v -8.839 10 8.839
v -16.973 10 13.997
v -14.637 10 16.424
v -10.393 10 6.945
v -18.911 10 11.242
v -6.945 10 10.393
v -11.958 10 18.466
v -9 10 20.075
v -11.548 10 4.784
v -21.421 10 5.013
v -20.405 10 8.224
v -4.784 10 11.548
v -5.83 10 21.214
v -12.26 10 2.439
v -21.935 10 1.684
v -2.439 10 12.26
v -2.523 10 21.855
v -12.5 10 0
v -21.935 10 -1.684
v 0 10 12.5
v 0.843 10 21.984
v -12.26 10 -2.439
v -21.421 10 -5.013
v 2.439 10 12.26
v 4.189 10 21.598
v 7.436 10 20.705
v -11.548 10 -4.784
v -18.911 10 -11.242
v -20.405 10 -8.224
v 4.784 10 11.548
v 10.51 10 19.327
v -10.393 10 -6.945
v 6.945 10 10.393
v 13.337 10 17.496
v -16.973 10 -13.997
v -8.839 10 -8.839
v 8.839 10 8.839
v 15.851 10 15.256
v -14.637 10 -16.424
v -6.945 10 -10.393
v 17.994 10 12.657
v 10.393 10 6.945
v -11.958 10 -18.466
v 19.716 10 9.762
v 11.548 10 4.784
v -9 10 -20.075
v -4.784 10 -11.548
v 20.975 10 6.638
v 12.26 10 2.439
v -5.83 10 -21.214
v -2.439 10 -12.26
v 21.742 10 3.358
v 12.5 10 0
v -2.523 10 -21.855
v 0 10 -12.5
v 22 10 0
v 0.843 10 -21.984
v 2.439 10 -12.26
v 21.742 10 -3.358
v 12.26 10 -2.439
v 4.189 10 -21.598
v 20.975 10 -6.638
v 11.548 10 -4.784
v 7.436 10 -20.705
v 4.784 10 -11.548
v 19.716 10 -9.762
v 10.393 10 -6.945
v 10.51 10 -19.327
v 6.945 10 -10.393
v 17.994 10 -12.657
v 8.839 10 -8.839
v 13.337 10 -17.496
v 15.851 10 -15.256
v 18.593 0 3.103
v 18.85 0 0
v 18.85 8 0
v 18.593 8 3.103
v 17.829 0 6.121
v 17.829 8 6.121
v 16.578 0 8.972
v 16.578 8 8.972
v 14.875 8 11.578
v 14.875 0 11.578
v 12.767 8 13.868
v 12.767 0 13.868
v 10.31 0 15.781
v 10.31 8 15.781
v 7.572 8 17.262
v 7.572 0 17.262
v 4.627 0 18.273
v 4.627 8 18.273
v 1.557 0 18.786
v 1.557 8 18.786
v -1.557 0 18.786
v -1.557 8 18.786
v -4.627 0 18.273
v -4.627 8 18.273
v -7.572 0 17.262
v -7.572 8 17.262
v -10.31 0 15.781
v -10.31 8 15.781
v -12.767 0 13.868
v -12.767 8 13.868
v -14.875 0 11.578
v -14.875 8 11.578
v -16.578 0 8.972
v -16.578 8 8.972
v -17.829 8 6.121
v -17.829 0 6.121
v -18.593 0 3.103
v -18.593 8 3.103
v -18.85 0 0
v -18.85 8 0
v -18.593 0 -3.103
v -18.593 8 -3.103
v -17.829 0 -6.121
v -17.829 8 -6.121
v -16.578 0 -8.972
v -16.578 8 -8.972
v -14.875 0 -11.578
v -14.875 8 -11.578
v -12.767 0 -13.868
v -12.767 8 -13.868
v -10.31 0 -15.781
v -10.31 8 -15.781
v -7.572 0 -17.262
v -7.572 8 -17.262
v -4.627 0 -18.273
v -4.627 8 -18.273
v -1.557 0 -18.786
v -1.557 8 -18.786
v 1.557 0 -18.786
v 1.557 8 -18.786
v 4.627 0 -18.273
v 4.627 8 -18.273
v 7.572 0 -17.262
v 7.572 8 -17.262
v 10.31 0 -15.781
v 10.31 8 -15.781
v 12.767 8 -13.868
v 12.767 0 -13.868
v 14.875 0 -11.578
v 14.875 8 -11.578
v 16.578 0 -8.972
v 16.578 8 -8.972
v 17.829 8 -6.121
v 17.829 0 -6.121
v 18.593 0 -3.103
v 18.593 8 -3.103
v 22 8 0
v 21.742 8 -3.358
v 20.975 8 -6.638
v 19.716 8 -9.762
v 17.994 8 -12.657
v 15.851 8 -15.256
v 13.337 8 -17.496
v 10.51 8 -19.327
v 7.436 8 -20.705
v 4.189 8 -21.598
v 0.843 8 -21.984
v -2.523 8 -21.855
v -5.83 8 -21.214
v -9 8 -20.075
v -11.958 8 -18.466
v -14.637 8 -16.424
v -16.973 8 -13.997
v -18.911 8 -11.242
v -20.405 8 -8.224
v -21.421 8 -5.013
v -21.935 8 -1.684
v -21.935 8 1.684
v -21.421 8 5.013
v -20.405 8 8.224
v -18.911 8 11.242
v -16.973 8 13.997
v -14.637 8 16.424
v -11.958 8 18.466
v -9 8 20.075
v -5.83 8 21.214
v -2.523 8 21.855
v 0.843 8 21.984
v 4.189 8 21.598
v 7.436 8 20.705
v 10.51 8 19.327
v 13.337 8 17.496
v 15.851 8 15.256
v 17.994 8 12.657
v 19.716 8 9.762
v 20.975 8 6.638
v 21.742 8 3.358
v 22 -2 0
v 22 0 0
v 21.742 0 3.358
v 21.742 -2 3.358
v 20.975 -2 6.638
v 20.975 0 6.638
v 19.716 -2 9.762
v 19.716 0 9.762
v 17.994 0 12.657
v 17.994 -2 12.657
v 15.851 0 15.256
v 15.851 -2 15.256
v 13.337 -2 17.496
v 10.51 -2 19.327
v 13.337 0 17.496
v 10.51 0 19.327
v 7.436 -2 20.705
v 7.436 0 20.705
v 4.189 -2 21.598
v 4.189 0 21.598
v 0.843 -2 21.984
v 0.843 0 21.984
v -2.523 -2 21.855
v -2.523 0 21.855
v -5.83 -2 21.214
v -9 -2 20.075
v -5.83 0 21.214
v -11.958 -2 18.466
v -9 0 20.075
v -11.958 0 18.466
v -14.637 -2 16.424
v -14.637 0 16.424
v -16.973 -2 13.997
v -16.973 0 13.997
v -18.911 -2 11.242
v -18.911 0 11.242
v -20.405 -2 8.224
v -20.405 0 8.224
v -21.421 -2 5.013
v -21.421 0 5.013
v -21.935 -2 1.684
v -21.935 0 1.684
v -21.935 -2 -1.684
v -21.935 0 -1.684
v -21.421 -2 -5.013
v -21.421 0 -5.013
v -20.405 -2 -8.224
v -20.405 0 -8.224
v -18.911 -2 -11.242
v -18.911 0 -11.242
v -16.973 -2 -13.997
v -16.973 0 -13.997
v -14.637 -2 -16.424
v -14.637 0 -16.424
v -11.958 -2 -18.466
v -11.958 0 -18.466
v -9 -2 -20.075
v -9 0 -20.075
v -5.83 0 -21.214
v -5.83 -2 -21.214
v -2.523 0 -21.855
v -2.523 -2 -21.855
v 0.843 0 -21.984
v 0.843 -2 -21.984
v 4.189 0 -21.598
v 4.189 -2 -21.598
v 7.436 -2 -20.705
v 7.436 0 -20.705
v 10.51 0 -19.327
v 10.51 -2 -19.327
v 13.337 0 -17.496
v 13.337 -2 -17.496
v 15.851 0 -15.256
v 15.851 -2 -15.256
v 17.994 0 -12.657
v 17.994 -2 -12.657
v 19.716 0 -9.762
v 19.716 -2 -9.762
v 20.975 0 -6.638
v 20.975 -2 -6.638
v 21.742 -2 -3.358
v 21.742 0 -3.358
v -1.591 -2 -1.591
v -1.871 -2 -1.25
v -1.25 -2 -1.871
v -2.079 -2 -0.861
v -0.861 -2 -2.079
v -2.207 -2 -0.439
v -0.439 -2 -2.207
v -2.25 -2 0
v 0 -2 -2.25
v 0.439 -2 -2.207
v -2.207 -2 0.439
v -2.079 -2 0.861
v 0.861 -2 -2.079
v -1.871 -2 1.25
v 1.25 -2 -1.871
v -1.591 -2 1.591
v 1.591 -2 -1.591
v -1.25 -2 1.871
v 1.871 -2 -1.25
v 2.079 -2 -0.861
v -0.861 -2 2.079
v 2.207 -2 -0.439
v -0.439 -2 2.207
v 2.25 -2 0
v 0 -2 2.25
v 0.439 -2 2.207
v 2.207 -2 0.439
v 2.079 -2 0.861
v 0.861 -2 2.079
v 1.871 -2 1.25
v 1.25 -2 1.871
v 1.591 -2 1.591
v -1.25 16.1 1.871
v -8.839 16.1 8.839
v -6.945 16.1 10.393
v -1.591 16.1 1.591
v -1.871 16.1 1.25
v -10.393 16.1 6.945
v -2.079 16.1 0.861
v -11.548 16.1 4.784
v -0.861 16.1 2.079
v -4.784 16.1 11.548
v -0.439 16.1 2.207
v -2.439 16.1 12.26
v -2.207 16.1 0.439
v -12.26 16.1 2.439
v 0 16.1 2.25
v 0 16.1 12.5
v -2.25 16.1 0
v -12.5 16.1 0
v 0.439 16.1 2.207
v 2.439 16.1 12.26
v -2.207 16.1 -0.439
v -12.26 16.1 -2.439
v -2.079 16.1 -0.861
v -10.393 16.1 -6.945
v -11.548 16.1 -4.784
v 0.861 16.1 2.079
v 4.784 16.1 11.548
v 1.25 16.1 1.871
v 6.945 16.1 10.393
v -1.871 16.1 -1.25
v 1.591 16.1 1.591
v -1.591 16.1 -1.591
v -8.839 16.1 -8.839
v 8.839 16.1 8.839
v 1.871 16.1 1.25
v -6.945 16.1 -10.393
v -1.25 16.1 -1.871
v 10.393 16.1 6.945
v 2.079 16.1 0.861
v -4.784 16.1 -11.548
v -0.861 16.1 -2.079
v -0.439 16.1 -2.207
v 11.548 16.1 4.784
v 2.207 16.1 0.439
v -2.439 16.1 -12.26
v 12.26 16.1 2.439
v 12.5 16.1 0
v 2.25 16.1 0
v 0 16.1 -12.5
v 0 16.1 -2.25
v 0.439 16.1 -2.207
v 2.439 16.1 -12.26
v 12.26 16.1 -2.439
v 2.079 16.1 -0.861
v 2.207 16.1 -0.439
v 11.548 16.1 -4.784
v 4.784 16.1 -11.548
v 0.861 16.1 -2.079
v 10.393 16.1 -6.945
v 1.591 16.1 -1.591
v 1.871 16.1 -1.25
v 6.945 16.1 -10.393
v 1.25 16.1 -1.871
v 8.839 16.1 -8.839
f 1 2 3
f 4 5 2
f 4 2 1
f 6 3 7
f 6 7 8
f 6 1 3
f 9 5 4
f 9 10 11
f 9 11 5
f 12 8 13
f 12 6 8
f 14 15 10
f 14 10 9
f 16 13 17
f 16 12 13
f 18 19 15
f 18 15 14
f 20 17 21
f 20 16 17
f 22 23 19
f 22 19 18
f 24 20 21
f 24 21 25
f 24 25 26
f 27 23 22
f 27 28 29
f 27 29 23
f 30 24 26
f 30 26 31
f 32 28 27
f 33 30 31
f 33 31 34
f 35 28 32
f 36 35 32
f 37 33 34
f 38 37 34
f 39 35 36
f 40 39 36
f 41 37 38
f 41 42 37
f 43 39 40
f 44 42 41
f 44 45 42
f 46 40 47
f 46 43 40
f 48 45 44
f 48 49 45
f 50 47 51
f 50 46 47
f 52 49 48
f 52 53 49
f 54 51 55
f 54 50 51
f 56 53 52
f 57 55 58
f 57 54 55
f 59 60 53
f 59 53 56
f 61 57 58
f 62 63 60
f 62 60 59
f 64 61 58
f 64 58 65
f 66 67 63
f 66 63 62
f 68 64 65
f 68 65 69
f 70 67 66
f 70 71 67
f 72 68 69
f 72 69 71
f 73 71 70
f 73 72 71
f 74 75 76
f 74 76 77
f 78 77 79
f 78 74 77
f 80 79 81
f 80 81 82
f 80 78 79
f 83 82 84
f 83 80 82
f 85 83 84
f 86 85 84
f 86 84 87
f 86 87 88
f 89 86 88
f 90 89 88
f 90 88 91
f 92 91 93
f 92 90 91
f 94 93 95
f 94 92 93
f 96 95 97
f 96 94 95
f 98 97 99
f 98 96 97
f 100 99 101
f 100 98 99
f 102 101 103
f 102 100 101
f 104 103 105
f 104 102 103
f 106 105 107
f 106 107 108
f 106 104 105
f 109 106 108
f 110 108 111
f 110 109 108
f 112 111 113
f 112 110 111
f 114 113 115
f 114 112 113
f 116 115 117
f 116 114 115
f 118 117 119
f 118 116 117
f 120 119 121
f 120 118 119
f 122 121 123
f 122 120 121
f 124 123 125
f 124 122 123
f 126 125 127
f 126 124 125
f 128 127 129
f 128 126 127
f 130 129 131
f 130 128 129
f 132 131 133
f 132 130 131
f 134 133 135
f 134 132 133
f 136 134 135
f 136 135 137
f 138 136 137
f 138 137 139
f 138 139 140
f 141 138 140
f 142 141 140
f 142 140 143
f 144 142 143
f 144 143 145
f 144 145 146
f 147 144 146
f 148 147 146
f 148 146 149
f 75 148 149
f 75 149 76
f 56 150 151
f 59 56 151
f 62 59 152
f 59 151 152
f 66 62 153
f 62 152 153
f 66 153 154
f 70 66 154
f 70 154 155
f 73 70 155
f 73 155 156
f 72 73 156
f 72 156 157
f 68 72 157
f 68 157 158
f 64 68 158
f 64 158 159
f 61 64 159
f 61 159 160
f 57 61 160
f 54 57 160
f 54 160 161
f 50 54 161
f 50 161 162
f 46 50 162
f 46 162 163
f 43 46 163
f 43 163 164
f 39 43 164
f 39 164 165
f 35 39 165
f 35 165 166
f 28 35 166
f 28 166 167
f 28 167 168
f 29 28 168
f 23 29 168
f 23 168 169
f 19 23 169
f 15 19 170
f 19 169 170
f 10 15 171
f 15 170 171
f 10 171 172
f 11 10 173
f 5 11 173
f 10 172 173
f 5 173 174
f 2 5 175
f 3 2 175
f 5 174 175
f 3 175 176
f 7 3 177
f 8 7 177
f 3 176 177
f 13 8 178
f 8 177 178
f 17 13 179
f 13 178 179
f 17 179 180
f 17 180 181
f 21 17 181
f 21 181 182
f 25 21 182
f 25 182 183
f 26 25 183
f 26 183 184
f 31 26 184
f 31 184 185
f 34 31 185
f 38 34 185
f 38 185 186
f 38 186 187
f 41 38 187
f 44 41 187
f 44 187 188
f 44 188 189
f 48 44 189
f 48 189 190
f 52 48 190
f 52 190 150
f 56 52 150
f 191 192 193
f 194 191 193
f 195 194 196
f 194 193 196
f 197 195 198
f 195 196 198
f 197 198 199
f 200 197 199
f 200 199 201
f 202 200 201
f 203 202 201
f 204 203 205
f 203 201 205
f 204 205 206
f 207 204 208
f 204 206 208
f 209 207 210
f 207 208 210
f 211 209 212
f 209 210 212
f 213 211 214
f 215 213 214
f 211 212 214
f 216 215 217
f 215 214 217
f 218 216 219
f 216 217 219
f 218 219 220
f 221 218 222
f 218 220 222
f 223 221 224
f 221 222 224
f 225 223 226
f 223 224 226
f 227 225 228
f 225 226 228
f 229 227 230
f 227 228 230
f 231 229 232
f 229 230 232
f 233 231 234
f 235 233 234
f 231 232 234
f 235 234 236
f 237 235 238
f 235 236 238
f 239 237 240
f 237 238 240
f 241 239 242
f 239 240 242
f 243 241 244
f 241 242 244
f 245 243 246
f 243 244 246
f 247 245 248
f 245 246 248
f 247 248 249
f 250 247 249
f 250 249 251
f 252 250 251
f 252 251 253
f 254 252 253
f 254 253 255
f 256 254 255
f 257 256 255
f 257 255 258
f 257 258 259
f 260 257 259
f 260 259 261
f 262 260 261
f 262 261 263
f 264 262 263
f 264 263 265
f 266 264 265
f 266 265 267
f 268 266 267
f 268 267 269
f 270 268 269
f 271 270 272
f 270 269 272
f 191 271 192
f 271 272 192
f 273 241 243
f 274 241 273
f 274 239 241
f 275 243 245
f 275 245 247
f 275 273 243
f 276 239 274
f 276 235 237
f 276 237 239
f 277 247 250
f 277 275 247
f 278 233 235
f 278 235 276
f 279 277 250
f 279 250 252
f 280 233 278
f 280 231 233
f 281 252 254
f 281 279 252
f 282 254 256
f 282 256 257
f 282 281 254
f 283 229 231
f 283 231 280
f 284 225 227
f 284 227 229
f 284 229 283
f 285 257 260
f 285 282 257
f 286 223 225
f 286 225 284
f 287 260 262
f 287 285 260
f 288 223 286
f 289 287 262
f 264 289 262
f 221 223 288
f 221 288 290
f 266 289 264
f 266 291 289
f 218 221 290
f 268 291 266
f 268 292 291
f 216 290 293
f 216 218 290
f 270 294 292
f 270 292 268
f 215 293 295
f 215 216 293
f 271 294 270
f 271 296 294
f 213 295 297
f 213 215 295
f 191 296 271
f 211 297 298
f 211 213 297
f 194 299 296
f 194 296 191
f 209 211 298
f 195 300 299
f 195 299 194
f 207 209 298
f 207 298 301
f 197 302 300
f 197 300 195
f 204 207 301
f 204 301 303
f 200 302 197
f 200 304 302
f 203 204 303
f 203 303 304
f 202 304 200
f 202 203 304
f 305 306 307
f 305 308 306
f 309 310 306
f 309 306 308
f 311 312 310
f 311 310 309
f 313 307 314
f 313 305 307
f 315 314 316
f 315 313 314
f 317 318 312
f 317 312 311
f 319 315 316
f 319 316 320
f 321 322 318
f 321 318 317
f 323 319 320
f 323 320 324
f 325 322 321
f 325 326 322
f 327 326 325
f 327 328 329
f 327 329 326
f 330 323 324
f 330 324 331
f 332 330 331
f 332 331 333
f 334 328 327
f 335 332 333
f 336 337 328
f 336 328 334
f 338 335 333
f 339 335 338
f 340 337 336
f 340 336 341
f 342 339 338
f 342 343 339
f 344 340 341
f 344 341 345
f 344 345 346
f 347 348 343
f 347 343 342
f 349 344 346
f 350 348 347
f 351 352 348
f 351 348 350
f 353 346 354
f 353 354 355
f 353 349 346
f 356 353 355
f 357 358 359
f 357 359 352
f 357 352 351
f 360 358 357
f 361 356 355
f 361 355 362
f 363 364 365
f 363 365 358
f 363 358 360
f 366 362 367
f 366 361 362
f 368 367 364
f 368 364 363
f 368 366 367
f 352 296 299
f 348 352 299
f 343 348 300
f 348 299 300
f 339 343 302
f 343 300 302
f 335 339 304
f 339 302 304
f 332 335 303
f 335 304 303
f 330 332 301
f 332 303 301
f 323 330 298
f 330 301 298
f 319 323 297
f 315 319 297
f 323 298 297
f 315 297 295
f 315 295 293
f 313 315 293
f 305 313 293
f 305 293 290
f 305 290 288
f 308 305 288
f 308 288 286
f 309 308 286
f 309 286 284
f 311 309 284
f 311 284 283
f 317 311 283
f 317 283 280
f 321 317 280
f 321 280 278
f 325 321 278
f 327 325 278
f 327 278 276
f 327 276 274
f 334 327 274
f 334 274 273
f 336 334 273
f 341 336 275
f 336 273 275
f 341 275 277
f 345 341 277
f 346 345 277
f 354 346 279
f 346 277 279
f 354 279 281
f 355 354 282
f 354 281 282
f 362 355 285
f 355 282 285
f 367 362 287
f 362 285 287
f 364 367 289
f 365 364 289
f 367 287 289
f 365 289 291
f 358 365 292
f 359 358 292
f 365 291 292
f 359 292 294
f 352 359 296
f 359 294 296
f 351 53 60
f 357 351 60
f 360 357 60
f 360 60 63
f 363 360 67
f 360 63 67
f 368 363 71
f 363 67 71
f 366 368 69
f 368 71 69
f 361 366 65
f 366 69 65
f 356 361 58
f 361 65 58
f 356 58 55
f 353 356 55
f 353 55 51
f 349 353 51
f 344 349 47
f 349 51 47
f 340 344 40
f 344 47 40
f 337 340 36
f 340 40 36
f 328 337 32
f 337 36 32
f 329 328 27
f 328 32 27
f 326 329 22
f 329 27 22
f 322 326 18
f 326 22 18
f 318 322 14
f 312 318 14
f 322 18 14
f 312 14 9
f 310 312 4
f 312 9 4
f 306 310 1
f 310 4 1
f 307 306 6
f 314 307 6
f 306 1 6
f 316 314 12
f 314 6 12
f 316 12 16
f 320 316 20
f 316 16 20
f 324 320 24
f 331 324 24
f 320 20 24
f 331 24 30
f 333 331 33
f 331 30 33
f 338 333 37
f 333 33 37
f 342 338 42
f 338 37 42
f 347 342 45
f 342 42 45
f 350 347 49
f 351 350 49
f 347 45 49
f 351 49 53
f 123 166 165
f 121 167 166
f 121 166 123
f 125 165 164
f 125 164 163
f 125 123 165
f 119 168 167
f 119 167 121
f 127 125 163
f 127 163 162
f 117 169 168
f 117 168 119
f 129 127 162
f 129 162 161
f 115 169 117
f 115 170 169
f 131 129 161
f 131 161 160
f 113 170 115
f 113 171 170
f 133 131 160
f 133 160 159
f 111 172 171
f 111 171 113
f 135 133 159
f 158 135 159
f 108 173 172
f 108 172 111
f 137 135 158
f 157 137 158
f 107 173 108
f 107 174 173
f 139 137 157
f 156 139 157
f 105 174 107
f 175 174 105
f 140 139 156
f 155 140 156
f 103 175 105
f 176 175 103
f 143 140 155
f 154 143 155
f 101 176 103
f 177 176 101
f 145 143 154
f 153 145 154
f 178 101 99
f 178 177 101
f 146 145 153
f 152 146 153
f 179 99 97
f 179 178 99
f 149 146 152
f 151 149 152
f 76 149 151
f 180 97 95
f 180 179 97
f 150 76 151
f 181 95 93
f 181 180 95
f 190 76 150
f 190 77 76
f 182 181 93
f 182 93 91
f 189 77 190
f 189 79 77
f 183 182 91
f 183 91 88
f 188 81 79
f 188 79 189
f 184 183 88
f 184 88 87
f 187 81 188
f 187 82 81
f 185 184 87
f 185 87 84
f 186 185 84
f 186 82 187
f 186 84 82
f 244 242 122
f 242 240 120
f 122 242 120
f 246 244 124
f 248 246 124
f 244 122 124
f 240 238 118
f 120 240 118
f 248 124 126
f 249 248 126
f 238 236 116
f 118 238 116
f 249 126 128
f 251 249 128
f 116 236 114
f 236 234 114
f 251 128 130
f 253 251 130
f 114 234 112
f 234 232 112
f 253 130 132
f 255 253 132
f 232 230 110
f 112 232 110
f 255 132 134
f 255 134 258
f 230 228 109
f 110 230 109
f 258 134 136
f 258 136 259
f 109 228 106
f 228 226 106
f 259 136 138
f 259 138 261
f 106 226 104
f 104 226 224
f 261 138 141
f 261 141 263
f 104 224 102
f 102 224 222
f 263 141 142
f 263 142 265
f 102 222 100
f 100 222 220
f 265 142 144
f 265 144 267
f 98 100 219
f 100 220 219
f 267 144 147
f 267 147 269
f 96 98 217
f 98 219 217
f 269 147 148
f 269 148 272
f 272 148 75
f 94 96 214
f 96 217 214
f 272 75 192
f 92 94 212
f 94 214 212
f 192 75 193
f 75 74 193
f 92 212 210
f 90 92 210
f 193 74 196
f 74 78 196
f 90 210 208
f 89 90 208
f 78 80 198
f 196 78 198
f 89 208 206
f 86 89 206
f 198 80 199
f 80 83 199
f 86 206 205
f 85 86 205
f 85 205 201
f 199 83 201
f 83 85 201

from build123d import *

# Parameters (mm, degrees)
SKETCH1_R           = 22
BOSS_EXTRUDE1_DEPTH = 10
SKETCH2_R           = 12.5
BOSS_EXTRUDE2_DEPTH = 6.1
SKETCH3_R           = 22
SKETCH3_R_2         = 18.85
CUT_EXTRUDE2_DEPTH  = 8
SKETCH5_R           = 22
BOSS_EXTRUDE3_DEPTH = 2
SKETCH6_R           = 2.25
CUT_EXTRUDE3_DEPTH  = 28


with BuildPart() as part:
    # Sketch1 → Boss-Extrude1 (new body)
    with BuildSketch(Plane(origin=(0, 0, 0), x_dir=(1, 0, 0), z_dir=(0, 1, 0))):
        Circle(SKETCH1_R)
    extrude(amount=BOSS_EXTRUDE1_DEPTH)

    # Sketch2 → Boss-Extrude2 (add)
    with BuildSketch(Plane(origin=(0, 10, 0), x_dir=(1, 0, 0), z_dir=(0, 1, 0))):
        Circle(SKETCH2_R)
    extrude(amount=BOSS_EXTRUDE2_DEPTH)

    # Sketch3 → Cut-Extrude2 (cut)
    with BuildSketch(Plane.XZ):
        Circle(SKETCH3_R)
        Circle(SKETCH3_R_2, mode=Mode.SUBTRACT)
    extrude(amount=-CUT_EXTRUDE2_DEPTH, mode=Mode.SUBTRACT)

    # Sketch5 → Boss-Extrude3 (add)
    with BuildSketch(Plane.XZ):
        Circle(SKETCH5_R)
    extrude(amount=BOSS_EXTRUDE3_DEPTH)

    # Sketch6 → Cut-Extrude3 (cut)
    with BuildSketch(Plane.XZ.offset(2)):
        Circle(SKETCH6_R)
    extrude(amount=-CUT_EXTRUDE3_DEPTH, mode=Mode.SUBTRACT)


solid = part.part
